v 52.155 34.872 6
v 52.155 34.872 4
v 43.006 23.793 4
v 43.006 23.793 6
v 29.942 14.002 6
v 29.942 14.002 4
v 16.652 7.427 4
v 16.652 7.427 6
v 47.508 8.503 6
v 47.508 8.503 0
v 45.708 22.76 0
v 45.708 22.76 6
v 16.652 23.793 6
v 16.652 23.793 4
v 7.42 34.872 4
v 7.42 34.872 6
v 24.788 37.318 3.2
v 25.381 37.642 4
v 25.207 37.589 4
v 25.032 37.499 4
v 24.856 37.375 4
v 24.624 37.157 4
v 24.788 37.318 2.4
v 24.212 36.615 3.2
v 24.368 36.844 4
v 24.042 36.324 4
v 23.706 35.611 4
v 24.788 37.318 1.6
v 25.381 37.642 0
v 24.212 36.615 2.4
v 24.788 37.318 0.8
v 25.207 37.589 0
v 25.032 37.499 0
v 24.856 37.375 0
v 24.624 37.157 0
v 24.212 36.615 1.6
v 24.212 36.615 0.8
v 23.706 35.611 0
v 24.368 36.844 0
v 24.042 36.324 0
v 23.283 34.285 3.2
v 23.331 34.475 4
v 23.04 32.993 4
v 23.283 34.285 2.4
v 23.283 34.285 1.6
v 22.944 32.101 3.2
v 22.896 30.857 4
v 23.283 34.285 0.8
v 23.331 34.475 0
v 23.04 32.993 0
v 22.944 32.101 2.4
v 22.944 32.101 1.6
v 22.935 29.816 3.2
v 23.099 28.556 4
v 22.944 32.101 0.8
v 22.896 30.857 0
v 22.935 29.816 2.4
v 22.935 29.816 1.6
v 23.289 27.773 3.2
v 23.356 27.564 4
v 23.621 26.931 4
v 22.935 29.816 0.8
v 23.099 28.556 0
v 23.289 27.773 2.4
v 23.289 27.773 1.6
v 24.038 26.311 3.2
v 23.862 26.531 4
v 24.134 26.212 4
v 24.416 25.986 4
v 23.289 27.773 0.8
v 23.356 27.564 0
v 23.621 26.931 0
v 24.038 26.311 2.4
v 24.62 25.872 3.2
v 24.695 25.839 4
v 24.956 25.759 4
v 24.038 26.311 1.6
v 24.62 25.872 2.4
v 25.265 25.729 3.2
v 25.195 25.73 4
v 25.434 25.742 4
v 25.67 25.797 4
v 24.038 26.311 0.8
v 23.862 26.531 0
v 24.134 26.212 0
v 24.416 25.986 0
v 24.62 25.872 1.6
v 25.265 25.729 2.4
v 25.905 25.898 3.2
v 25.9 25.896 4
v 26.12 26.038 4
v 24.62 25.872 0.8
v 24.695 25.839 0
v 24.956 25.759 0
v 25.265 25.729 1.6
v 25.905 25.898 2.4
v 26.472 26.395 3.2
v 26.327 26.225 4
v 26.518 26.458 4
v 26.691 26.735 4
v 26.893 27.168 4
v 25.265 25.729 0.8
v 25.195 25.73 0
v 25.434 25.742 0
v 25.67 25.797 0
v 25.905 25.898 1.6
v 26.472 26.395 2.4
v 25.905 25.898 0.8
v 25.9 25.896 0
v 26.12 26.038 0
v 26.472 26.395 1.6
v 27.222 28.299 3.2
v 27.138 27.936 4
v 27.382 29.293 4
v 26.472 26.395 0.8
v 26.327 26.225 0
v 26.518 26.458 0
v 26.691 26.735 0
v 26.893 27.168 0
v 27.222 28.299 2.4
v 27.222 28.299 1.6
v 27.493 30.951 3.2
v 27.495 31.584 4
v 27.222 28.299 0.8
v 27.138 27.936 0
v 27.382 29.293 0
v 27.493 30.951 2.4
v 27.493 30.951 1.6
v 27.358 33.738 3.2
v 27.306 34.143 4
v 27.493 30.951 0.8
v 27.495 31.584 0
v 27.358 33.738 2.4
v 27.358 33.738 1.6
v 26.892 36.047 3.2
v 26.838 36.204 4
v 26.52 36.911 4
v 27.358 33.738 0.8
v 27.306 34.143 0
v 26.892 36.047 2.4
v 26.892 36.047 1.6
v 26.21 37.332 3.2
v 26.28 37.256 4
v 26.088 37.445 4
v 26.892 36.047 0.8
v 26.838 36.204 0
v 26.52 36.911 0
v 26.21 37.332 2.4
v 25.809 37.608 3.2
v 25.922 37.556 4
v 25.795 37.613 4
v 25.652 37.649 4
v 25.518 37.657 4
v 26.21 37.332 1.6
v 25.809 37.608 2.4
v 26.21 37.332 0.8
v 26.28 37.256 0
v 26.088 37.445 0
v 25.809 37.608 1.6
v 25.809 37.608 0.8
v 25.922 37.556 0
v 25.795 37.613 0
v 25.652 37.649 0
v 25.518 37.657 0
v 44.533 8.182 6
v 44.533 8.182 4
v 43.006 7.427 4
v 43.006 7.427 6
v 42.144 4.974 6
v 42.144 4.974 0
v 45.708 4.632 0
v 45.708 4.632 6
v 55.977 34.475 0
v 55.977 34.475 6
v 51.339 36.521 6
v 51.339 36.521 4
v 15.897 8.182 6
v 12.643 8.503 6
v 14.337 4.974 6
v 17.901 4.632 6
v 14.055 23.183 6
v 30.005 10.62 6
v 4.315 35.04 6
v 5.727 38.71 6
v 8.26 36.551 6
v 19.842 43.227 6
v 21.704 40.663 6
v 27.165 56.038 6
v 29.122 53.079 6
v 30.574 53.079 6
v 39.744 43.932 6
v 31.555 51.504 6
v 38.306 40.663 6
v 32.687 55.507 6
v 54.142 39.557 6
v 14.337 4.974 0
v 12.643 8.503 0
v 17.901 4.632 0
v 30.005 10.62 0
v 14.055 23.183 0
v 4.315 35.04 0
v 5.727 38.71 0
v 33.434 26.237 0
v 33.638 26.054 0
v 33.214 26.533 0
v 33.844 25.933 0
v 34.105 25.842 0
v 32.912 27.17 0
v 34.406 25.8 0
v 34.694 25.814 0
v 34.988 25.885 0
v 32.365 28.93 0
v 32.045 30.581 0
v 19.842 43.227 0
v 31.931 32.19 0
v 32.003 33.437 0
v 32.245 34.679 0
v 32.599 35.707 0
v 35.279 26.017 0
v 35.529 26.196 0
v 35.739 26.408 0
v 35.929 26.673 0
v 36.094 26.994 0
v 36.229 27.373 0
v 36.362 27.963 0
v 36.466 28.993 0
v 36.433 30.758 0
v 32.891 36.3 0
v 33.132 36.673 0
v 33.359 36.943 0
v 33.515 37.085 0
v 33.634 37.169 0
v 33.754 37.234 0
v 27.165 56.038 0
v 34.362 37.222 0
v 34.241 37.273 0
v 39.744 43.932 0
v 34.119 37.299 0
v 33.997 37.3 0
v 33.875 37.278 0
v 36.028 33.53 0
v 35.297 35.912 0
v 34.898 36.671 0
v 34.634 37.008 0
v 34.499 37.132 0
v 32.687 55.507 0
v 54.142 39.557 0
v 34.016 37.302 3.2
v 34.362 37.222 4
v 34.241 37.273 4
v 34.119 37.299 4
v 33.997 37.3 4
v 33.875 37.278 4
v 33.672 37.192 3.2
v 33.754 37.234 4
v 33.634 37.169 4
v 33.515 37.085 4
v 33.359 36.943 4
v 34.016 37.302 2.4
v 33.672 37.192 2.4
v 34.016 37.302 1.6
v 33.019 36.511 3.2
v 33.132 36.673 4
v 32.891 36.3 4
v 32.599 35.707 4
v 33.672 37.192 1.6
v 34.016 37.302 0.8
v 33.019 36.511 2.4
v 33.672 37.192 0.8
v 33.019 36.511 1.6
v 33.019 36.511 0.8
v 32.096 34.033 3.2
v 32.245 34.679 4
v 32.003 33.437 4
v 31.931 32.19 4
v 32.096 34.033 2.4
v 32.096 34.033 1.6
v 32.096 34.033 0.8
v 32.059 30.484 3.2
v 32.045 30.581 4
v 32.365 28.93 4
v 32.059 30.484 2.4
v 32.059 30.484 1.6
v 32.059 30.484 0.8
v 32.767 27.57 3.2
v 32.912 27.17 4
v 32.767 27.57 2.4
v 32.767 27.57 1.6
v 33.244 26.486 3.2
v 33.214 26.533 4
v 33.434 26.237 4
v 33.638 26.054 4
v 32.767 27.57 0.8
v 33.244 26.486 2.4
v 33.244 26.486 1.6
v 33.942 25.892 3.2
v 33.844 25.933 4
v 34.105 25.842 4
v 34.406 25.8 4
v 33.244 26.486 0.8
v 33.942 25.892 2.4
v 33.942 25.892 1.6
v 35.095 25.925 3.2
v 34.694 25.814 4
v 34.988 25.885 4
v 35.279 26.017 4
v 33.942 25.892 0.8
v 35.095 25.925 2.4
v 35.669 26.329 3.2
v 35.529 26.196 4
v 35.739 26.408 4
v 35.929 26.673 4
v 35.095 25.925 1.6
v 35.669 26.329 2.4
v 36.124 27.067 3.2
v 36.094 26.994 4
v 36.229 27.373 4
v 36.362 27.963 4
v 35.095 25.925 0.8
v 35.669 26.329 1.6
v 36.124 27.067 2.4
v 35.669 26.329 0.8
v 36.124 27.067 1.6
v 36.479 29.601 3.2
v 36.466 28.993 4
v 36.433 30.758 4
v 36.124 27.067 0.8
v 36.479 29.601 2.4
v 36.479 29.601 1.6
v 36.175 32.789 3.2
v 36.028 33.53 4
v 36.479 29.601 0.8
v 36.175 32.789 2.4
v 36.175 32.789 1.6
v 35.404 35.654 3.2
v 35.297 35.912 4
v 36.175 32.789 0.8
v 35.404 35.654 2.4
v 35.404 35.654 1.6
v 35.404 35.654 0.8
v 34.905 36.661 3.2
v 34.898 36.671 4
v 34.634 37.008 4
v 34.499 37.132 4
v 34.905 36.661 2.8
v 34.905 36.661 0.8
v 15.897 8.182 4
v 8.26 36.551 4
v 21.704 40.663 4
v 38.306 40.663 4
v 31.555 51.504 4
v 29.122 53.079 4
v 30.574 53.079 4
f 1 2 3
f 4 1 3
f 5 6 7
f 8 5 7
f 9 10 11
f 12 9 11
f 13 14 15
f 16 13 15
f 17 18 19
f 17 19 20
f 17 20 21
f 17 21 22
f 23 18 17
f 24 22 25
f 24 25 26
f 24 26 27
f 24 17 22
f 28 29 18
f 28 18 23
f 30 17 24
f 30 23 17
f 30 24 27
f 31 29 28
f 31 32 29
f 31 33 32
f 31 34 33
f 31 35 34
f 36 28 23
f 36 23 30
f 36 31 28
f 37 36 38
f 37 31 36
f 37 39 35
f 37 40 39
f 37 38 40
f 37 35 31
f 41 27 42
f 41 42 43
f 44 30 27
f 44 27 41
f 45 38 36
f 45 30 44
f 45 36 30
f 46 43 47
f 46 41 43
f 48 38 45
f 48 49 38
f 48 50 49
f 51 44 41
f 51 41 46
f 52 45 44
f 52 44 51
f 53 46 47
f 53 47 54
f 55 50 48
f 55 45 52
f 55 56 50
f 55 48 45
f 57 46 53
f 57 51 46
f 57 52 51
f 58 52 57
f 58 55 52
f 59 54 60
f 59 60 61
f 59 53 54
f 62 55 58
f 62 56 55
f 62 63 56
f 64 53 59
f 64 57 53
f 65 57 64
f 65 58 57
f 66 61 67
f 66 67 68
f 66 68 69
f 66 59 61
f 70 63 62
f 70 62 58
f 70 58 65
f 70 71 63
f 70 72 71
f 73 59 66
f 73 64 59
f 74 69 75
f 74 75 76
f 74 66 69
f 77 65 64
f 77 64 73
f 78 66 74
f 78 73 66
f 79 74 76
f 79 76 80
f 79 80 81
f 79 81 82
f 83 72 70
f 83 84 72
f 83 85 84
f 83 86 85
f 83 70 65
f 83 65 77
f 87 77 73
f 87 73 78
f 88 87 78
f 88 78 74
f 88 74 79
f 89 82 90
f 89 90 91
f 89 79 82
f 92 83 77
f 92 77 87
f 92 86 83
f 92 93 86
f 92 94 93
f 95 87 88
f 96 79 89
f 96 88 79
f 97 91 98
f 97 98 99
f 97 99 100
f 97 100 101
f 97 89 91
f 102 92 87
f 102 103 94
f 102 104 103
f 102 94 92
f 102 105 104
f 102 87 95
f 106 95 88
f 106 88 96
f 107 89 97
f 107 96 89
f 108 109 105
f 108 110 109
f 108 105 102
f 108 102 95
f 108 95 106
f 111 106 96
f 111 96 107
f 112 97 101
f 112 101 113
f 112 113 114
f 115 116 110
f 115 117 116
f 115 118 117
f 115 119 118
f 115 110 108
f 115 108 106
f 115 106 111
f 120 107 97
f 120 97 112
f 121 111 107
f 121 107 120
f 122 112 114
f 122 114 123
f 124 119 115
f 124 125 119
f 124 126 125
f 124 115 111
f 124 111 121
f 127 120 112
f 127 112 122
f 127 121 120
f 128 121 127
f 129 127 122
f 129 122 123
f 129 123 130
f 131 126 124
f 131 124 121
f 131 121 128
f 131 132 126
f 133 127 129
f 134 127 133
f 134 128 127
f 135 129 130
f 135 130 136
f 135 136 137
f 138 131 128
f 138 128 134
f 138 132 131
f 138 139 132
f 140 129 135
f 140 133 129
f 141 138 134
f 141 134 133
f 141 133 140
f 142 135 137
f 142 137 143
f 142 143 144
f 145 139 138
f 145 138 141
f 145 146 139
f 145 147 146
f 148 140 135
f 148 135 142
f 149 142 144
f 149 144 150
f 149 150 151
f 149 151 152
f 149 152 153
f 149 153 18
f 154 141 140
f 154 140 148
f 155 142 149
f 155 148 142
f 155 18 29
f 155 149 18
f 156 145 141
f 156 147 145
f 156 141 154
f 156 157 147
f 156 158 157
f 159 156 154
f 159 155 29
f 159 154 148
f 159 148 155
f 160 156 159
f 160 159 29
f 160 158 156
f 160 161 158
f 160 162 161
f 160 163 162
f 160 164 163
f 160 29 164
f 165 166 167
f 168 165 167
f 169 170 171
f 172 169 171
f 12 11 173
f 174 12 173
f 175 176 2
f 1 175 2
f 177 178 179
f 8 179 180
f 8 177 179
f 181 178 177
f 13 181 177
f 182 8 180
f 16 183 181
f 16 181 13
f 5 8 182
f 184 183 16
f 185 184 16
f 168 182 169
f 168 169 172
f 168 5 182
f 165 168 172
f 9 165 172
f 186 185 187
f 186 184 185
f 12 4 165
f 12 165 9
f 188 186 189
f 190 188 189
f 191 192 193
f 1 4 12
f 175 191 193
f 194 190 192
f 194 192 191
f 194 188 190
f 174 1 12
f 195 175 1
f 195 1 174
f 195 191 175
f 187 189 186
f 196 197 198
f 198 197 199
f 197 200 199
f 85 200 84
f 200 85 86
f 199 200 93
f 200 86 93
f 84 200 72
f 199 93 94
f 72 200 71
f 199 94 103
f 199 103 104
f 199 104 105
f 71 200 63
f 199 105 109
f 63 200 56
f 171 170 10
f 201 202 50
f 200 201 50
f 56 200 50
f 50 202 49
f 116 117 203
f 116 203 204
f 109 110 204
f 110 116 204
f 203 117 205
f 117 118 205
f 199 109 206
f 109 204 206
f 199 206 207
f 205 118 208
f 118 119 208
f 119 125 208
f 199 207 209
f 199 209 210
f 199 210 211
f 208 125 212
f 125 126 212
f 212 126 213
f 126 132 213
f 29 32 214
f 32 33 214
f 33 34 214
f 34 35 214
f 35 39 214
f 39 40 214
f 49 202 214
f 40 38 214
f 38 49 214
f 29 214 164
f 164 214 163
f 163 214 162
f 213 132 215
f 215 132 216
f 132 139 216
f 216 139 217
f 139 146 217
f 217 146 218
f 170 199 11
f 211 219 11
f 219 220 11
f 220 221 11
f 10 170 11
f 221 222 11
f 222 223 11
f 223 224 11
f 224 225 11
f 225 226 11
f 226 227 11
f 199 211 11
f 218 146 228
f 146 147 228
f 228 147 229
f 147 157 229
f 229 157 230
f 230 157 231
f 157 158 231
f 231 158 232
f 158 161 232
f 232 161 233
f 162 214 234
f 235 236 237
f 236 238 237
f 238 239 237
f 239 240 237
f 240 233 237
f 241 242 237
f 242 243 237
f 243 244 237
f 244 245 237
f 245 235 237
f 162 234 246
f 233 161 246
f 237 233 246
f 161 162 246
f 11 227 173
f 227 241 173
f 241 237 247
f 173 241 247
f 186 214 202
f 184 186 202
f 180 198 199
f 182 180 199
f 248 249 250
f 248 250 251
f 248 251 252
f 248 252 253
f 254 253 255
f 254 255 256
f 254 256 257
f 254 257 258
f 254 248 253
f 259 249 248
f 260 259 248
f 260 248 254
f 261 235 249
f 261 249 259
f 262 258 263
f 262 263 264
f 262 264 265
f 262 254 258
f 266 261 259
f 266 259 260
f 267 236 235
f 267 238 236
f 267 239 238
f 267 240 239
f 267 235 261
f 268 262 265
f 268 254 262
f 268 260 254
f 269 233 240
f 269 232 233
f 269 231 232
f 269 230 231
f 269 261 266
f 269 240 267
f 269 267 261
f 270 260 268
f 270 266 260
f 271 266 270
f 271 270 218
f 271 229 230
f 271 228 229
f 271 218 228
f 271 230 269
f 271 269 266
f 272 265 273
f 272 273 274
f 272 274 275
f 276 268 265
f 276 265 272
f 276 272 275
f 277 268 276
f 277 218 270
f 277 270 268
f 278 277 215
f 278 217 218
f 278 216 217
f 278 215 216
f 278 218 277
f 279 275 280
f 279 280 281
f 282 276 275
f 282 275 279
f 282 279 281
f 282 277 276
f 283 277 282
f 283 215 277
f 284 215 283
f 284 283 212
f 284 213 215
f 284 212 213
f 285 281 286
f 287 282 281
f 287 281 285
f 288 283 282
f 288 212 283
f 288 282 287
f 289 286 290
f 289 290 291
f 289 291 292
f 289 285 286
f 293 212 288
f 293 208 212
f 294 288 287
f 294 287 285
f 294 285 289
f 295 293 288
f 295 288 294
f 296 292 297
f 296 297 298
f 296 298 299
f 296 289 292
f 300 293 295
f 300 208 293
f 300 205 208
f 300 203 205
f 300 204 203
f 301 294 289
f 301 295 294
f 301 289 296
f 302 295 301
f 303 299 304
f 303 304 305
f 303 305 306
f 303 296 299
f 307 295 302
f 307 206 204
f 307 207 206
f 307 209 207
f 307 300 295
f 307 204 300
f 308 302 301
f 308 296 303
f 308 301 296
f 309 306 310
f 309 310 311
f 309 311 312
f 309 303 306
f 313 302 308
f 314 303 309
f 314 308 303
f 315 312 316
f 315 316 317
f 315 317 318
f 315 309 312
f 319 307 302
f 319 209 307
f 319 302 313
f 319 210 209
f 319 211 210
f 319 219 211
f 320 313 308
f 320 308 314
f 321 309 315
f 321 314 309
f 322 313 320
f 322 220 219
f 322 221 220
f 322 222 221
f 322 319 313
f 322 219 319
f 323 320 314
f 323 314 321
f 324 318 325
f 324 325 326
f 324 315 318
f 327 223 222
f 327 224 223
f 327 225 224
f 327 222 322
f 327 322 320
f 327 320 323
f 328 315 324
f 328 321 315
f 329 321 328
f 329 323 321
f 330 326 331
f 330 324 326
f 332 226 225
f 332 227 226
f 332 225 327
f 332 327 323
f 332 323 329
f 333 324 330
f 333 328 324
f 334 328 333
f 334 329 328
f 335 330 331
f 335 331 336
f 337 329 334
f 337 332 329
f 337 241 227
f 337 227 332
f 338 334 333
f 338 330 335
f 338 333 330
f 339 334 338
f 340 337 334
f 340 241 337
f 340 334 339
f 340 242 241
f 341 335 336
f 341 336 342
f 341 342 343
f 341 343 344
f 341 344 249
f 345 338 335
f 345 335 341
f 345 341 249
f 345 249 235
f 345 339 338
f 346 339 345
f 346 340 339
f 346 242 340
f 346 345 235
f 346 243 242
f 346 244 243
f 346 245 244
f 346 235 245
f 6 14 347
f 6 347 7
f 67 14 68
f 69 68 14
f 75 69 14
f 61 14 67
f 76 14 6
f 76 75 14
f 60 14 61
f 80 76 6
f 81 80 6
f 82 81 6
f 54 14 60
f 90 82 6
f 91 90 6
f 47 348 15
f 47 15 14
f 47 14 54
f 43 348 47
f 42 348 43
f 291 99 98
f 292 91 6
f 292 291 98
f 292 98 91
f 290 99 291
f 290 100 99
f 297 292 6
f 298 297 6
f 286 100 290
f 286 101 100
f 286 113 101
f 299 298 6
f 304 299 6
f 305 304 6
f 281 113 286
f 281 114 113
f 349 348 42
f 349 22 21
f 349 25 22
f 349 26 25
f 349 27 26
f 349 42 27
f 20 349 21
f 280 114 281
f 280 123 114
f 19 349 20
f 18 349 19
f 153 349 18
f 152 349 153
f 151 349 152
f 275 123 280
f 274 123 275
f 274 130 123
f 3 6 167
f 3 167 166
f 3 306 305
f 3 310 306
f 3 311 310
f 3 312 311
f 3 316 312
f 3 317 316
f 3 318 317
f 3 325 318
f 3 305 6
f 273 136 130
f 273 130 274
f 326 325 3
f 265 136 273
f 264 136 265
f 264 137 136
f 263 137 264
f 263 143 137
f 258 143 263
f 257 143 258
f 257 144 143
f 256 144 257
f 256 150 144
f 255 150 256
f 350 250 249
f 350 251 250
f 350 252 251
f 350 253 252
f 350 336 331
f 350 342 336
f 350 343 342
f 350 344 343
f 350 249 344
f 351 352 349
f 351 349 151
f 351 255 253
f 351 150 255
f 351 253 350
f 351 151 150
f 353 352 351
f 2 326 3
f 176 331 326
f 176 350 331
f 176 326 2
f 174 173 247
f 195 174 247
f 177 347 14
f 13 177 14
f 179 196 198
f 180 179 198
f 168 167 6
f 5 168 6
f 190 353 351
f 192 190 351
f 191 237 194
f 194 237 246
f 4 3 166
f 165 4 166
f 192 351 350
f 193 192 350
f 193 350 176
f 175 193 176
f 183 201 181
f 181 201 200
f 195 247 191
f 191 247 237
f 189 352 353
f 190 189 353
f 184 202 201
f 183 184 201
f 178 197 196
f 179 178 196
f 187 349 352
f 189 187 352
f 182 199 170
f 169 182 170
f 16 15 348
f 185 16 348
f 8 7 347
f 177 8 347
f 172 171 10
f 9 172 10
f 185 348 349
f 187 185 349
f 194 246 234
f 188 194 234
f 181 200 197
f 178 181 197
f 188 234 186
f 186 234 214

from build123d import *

# Parameters (mm, degrees)
F1_DEPTH = 4
F2_DEPTH = 6


# Not quite as in the source:
# - the program builds the solid bodies; features that only make, move or delete a surface that nothing else refers to are left out


with BuildPart() as f1:
    # F0 (on Top) → F1 (new body)
    with BuildSketch(Plane.XY):
        Polygon((21.7038933188, 40.663164109), (8.2595115528, 36.550603807), (7.4202134274, 34.8720103502), (16.652489081, 23.793278262), (15.8971212804, 8.1823393703), (16.652489081, 7.4269715697), (29.9416775716, 14.0020314224), (43.0064387619, 7.4269715697), (44.5331511124, 8.1823393703), (43.0064387619, 23.793278262), (52.1547831595, 34.8720103502), (51.3386978339, 36.5214419841), (38.3063703775, 40.663164109), (31.5554067492, 51.5035130084), (30.5740684422, 53.0792954037), (29.1223078966, 53.0792954037), align=None)
        with BuildLine():
            add(Edge.make_bspline(
                [(25.3811851144, 37.6416891813), (24.5993217345, 37.4863257412), (22.5300561127, 34.3153306276), (22.8365480412, 25.5837934463), (27.8864125101, 25.4534071145), (27.6429800893, 36.1332272512), (25.9635847642, 37.7574173449), (25.3811851144, 37.6416891813)],
                knots=[0, 0, 0, 0, 0.1813668972, 0.4393300523, 0.5815805793, 0.8649022066, 1, 1, 1, 1], degree=3))
        make_face(mode=Mode.SUBTRACT)
        with BuildLine():
            add(Edge.make_bspline(
                [(34.3616716564, 37.2220426798), (33.4467151003, 37.7104749668), (31.1715810093, 33.5652339009), (32.5688269727, 27.7274369068), (33.6539912936, 25.4758331021), (37.7493894328, 26.2185759497), (35.846752744, 36.4292601731), (34.3616716564, 37.2220426798)],
                knots=[0, 0, 0, 0, 0.1841149483, 0.4213807172, 0.554620993, 0.7011599886, 1, 1, 1, 1], degree=3))
        make_face(mode=Mode.SUBTRACT)
    extrude(amount=F1_DEPTH)

    # F0 (on Top) → F2 (join)
    with BuildSketch(Plane.XY):
        Polygon((27.1650796672, 56.0378708923), (19.8419597, 43.2266667485), (5.7267113589, 38.7097857893), (4.3151844293, 35.039819777), (14.0547072515, 23.1830105186), (12.6431845129, 8.5031520575), (14.3370144069, 4.974339623), (17.900740458, 4.6316741696), (30.0049390644, 10.6204394251), (42.1440564096, 4.974339623), (45.7077824607, 4.6316741696), (47.5078485906, 8.5031520575), (45.7077824607, 22.7595549077), (55.9770017862, 34.4752110541), (54.1420131922, 39.5567007363), (39.7444628179, 43.9324304461), (32.6868370175, 55.5069334805), align=None)
        Polygon((7.4202134274, 34.8720103502), (8.2595115528, 36.550603807), (21.7038933188, 40.663164109), (29.1223078966, 53.0792954037), (30.5740684422, 53.0792954037), (31.5554067492, 51.5035130084), (38.3063703775, 40.663164109), (51.3386978339, 36.5214419841), (52.1547831595, 34.8720103502), (43.0064387619, 23.793278262), (44.5331511124, 8.1823393703), (43.0064387619, 7.4269715697), (29.9416775716, 14.0020314224), (16.652489081, 7.4269715697), (15.8971212804, 8.1823393703), (16.652489081, 23.793278262), align=None, mode=Mode.SUBTRACT)
    extrude(amount=F2_DEPTH)


solid = f1.part
